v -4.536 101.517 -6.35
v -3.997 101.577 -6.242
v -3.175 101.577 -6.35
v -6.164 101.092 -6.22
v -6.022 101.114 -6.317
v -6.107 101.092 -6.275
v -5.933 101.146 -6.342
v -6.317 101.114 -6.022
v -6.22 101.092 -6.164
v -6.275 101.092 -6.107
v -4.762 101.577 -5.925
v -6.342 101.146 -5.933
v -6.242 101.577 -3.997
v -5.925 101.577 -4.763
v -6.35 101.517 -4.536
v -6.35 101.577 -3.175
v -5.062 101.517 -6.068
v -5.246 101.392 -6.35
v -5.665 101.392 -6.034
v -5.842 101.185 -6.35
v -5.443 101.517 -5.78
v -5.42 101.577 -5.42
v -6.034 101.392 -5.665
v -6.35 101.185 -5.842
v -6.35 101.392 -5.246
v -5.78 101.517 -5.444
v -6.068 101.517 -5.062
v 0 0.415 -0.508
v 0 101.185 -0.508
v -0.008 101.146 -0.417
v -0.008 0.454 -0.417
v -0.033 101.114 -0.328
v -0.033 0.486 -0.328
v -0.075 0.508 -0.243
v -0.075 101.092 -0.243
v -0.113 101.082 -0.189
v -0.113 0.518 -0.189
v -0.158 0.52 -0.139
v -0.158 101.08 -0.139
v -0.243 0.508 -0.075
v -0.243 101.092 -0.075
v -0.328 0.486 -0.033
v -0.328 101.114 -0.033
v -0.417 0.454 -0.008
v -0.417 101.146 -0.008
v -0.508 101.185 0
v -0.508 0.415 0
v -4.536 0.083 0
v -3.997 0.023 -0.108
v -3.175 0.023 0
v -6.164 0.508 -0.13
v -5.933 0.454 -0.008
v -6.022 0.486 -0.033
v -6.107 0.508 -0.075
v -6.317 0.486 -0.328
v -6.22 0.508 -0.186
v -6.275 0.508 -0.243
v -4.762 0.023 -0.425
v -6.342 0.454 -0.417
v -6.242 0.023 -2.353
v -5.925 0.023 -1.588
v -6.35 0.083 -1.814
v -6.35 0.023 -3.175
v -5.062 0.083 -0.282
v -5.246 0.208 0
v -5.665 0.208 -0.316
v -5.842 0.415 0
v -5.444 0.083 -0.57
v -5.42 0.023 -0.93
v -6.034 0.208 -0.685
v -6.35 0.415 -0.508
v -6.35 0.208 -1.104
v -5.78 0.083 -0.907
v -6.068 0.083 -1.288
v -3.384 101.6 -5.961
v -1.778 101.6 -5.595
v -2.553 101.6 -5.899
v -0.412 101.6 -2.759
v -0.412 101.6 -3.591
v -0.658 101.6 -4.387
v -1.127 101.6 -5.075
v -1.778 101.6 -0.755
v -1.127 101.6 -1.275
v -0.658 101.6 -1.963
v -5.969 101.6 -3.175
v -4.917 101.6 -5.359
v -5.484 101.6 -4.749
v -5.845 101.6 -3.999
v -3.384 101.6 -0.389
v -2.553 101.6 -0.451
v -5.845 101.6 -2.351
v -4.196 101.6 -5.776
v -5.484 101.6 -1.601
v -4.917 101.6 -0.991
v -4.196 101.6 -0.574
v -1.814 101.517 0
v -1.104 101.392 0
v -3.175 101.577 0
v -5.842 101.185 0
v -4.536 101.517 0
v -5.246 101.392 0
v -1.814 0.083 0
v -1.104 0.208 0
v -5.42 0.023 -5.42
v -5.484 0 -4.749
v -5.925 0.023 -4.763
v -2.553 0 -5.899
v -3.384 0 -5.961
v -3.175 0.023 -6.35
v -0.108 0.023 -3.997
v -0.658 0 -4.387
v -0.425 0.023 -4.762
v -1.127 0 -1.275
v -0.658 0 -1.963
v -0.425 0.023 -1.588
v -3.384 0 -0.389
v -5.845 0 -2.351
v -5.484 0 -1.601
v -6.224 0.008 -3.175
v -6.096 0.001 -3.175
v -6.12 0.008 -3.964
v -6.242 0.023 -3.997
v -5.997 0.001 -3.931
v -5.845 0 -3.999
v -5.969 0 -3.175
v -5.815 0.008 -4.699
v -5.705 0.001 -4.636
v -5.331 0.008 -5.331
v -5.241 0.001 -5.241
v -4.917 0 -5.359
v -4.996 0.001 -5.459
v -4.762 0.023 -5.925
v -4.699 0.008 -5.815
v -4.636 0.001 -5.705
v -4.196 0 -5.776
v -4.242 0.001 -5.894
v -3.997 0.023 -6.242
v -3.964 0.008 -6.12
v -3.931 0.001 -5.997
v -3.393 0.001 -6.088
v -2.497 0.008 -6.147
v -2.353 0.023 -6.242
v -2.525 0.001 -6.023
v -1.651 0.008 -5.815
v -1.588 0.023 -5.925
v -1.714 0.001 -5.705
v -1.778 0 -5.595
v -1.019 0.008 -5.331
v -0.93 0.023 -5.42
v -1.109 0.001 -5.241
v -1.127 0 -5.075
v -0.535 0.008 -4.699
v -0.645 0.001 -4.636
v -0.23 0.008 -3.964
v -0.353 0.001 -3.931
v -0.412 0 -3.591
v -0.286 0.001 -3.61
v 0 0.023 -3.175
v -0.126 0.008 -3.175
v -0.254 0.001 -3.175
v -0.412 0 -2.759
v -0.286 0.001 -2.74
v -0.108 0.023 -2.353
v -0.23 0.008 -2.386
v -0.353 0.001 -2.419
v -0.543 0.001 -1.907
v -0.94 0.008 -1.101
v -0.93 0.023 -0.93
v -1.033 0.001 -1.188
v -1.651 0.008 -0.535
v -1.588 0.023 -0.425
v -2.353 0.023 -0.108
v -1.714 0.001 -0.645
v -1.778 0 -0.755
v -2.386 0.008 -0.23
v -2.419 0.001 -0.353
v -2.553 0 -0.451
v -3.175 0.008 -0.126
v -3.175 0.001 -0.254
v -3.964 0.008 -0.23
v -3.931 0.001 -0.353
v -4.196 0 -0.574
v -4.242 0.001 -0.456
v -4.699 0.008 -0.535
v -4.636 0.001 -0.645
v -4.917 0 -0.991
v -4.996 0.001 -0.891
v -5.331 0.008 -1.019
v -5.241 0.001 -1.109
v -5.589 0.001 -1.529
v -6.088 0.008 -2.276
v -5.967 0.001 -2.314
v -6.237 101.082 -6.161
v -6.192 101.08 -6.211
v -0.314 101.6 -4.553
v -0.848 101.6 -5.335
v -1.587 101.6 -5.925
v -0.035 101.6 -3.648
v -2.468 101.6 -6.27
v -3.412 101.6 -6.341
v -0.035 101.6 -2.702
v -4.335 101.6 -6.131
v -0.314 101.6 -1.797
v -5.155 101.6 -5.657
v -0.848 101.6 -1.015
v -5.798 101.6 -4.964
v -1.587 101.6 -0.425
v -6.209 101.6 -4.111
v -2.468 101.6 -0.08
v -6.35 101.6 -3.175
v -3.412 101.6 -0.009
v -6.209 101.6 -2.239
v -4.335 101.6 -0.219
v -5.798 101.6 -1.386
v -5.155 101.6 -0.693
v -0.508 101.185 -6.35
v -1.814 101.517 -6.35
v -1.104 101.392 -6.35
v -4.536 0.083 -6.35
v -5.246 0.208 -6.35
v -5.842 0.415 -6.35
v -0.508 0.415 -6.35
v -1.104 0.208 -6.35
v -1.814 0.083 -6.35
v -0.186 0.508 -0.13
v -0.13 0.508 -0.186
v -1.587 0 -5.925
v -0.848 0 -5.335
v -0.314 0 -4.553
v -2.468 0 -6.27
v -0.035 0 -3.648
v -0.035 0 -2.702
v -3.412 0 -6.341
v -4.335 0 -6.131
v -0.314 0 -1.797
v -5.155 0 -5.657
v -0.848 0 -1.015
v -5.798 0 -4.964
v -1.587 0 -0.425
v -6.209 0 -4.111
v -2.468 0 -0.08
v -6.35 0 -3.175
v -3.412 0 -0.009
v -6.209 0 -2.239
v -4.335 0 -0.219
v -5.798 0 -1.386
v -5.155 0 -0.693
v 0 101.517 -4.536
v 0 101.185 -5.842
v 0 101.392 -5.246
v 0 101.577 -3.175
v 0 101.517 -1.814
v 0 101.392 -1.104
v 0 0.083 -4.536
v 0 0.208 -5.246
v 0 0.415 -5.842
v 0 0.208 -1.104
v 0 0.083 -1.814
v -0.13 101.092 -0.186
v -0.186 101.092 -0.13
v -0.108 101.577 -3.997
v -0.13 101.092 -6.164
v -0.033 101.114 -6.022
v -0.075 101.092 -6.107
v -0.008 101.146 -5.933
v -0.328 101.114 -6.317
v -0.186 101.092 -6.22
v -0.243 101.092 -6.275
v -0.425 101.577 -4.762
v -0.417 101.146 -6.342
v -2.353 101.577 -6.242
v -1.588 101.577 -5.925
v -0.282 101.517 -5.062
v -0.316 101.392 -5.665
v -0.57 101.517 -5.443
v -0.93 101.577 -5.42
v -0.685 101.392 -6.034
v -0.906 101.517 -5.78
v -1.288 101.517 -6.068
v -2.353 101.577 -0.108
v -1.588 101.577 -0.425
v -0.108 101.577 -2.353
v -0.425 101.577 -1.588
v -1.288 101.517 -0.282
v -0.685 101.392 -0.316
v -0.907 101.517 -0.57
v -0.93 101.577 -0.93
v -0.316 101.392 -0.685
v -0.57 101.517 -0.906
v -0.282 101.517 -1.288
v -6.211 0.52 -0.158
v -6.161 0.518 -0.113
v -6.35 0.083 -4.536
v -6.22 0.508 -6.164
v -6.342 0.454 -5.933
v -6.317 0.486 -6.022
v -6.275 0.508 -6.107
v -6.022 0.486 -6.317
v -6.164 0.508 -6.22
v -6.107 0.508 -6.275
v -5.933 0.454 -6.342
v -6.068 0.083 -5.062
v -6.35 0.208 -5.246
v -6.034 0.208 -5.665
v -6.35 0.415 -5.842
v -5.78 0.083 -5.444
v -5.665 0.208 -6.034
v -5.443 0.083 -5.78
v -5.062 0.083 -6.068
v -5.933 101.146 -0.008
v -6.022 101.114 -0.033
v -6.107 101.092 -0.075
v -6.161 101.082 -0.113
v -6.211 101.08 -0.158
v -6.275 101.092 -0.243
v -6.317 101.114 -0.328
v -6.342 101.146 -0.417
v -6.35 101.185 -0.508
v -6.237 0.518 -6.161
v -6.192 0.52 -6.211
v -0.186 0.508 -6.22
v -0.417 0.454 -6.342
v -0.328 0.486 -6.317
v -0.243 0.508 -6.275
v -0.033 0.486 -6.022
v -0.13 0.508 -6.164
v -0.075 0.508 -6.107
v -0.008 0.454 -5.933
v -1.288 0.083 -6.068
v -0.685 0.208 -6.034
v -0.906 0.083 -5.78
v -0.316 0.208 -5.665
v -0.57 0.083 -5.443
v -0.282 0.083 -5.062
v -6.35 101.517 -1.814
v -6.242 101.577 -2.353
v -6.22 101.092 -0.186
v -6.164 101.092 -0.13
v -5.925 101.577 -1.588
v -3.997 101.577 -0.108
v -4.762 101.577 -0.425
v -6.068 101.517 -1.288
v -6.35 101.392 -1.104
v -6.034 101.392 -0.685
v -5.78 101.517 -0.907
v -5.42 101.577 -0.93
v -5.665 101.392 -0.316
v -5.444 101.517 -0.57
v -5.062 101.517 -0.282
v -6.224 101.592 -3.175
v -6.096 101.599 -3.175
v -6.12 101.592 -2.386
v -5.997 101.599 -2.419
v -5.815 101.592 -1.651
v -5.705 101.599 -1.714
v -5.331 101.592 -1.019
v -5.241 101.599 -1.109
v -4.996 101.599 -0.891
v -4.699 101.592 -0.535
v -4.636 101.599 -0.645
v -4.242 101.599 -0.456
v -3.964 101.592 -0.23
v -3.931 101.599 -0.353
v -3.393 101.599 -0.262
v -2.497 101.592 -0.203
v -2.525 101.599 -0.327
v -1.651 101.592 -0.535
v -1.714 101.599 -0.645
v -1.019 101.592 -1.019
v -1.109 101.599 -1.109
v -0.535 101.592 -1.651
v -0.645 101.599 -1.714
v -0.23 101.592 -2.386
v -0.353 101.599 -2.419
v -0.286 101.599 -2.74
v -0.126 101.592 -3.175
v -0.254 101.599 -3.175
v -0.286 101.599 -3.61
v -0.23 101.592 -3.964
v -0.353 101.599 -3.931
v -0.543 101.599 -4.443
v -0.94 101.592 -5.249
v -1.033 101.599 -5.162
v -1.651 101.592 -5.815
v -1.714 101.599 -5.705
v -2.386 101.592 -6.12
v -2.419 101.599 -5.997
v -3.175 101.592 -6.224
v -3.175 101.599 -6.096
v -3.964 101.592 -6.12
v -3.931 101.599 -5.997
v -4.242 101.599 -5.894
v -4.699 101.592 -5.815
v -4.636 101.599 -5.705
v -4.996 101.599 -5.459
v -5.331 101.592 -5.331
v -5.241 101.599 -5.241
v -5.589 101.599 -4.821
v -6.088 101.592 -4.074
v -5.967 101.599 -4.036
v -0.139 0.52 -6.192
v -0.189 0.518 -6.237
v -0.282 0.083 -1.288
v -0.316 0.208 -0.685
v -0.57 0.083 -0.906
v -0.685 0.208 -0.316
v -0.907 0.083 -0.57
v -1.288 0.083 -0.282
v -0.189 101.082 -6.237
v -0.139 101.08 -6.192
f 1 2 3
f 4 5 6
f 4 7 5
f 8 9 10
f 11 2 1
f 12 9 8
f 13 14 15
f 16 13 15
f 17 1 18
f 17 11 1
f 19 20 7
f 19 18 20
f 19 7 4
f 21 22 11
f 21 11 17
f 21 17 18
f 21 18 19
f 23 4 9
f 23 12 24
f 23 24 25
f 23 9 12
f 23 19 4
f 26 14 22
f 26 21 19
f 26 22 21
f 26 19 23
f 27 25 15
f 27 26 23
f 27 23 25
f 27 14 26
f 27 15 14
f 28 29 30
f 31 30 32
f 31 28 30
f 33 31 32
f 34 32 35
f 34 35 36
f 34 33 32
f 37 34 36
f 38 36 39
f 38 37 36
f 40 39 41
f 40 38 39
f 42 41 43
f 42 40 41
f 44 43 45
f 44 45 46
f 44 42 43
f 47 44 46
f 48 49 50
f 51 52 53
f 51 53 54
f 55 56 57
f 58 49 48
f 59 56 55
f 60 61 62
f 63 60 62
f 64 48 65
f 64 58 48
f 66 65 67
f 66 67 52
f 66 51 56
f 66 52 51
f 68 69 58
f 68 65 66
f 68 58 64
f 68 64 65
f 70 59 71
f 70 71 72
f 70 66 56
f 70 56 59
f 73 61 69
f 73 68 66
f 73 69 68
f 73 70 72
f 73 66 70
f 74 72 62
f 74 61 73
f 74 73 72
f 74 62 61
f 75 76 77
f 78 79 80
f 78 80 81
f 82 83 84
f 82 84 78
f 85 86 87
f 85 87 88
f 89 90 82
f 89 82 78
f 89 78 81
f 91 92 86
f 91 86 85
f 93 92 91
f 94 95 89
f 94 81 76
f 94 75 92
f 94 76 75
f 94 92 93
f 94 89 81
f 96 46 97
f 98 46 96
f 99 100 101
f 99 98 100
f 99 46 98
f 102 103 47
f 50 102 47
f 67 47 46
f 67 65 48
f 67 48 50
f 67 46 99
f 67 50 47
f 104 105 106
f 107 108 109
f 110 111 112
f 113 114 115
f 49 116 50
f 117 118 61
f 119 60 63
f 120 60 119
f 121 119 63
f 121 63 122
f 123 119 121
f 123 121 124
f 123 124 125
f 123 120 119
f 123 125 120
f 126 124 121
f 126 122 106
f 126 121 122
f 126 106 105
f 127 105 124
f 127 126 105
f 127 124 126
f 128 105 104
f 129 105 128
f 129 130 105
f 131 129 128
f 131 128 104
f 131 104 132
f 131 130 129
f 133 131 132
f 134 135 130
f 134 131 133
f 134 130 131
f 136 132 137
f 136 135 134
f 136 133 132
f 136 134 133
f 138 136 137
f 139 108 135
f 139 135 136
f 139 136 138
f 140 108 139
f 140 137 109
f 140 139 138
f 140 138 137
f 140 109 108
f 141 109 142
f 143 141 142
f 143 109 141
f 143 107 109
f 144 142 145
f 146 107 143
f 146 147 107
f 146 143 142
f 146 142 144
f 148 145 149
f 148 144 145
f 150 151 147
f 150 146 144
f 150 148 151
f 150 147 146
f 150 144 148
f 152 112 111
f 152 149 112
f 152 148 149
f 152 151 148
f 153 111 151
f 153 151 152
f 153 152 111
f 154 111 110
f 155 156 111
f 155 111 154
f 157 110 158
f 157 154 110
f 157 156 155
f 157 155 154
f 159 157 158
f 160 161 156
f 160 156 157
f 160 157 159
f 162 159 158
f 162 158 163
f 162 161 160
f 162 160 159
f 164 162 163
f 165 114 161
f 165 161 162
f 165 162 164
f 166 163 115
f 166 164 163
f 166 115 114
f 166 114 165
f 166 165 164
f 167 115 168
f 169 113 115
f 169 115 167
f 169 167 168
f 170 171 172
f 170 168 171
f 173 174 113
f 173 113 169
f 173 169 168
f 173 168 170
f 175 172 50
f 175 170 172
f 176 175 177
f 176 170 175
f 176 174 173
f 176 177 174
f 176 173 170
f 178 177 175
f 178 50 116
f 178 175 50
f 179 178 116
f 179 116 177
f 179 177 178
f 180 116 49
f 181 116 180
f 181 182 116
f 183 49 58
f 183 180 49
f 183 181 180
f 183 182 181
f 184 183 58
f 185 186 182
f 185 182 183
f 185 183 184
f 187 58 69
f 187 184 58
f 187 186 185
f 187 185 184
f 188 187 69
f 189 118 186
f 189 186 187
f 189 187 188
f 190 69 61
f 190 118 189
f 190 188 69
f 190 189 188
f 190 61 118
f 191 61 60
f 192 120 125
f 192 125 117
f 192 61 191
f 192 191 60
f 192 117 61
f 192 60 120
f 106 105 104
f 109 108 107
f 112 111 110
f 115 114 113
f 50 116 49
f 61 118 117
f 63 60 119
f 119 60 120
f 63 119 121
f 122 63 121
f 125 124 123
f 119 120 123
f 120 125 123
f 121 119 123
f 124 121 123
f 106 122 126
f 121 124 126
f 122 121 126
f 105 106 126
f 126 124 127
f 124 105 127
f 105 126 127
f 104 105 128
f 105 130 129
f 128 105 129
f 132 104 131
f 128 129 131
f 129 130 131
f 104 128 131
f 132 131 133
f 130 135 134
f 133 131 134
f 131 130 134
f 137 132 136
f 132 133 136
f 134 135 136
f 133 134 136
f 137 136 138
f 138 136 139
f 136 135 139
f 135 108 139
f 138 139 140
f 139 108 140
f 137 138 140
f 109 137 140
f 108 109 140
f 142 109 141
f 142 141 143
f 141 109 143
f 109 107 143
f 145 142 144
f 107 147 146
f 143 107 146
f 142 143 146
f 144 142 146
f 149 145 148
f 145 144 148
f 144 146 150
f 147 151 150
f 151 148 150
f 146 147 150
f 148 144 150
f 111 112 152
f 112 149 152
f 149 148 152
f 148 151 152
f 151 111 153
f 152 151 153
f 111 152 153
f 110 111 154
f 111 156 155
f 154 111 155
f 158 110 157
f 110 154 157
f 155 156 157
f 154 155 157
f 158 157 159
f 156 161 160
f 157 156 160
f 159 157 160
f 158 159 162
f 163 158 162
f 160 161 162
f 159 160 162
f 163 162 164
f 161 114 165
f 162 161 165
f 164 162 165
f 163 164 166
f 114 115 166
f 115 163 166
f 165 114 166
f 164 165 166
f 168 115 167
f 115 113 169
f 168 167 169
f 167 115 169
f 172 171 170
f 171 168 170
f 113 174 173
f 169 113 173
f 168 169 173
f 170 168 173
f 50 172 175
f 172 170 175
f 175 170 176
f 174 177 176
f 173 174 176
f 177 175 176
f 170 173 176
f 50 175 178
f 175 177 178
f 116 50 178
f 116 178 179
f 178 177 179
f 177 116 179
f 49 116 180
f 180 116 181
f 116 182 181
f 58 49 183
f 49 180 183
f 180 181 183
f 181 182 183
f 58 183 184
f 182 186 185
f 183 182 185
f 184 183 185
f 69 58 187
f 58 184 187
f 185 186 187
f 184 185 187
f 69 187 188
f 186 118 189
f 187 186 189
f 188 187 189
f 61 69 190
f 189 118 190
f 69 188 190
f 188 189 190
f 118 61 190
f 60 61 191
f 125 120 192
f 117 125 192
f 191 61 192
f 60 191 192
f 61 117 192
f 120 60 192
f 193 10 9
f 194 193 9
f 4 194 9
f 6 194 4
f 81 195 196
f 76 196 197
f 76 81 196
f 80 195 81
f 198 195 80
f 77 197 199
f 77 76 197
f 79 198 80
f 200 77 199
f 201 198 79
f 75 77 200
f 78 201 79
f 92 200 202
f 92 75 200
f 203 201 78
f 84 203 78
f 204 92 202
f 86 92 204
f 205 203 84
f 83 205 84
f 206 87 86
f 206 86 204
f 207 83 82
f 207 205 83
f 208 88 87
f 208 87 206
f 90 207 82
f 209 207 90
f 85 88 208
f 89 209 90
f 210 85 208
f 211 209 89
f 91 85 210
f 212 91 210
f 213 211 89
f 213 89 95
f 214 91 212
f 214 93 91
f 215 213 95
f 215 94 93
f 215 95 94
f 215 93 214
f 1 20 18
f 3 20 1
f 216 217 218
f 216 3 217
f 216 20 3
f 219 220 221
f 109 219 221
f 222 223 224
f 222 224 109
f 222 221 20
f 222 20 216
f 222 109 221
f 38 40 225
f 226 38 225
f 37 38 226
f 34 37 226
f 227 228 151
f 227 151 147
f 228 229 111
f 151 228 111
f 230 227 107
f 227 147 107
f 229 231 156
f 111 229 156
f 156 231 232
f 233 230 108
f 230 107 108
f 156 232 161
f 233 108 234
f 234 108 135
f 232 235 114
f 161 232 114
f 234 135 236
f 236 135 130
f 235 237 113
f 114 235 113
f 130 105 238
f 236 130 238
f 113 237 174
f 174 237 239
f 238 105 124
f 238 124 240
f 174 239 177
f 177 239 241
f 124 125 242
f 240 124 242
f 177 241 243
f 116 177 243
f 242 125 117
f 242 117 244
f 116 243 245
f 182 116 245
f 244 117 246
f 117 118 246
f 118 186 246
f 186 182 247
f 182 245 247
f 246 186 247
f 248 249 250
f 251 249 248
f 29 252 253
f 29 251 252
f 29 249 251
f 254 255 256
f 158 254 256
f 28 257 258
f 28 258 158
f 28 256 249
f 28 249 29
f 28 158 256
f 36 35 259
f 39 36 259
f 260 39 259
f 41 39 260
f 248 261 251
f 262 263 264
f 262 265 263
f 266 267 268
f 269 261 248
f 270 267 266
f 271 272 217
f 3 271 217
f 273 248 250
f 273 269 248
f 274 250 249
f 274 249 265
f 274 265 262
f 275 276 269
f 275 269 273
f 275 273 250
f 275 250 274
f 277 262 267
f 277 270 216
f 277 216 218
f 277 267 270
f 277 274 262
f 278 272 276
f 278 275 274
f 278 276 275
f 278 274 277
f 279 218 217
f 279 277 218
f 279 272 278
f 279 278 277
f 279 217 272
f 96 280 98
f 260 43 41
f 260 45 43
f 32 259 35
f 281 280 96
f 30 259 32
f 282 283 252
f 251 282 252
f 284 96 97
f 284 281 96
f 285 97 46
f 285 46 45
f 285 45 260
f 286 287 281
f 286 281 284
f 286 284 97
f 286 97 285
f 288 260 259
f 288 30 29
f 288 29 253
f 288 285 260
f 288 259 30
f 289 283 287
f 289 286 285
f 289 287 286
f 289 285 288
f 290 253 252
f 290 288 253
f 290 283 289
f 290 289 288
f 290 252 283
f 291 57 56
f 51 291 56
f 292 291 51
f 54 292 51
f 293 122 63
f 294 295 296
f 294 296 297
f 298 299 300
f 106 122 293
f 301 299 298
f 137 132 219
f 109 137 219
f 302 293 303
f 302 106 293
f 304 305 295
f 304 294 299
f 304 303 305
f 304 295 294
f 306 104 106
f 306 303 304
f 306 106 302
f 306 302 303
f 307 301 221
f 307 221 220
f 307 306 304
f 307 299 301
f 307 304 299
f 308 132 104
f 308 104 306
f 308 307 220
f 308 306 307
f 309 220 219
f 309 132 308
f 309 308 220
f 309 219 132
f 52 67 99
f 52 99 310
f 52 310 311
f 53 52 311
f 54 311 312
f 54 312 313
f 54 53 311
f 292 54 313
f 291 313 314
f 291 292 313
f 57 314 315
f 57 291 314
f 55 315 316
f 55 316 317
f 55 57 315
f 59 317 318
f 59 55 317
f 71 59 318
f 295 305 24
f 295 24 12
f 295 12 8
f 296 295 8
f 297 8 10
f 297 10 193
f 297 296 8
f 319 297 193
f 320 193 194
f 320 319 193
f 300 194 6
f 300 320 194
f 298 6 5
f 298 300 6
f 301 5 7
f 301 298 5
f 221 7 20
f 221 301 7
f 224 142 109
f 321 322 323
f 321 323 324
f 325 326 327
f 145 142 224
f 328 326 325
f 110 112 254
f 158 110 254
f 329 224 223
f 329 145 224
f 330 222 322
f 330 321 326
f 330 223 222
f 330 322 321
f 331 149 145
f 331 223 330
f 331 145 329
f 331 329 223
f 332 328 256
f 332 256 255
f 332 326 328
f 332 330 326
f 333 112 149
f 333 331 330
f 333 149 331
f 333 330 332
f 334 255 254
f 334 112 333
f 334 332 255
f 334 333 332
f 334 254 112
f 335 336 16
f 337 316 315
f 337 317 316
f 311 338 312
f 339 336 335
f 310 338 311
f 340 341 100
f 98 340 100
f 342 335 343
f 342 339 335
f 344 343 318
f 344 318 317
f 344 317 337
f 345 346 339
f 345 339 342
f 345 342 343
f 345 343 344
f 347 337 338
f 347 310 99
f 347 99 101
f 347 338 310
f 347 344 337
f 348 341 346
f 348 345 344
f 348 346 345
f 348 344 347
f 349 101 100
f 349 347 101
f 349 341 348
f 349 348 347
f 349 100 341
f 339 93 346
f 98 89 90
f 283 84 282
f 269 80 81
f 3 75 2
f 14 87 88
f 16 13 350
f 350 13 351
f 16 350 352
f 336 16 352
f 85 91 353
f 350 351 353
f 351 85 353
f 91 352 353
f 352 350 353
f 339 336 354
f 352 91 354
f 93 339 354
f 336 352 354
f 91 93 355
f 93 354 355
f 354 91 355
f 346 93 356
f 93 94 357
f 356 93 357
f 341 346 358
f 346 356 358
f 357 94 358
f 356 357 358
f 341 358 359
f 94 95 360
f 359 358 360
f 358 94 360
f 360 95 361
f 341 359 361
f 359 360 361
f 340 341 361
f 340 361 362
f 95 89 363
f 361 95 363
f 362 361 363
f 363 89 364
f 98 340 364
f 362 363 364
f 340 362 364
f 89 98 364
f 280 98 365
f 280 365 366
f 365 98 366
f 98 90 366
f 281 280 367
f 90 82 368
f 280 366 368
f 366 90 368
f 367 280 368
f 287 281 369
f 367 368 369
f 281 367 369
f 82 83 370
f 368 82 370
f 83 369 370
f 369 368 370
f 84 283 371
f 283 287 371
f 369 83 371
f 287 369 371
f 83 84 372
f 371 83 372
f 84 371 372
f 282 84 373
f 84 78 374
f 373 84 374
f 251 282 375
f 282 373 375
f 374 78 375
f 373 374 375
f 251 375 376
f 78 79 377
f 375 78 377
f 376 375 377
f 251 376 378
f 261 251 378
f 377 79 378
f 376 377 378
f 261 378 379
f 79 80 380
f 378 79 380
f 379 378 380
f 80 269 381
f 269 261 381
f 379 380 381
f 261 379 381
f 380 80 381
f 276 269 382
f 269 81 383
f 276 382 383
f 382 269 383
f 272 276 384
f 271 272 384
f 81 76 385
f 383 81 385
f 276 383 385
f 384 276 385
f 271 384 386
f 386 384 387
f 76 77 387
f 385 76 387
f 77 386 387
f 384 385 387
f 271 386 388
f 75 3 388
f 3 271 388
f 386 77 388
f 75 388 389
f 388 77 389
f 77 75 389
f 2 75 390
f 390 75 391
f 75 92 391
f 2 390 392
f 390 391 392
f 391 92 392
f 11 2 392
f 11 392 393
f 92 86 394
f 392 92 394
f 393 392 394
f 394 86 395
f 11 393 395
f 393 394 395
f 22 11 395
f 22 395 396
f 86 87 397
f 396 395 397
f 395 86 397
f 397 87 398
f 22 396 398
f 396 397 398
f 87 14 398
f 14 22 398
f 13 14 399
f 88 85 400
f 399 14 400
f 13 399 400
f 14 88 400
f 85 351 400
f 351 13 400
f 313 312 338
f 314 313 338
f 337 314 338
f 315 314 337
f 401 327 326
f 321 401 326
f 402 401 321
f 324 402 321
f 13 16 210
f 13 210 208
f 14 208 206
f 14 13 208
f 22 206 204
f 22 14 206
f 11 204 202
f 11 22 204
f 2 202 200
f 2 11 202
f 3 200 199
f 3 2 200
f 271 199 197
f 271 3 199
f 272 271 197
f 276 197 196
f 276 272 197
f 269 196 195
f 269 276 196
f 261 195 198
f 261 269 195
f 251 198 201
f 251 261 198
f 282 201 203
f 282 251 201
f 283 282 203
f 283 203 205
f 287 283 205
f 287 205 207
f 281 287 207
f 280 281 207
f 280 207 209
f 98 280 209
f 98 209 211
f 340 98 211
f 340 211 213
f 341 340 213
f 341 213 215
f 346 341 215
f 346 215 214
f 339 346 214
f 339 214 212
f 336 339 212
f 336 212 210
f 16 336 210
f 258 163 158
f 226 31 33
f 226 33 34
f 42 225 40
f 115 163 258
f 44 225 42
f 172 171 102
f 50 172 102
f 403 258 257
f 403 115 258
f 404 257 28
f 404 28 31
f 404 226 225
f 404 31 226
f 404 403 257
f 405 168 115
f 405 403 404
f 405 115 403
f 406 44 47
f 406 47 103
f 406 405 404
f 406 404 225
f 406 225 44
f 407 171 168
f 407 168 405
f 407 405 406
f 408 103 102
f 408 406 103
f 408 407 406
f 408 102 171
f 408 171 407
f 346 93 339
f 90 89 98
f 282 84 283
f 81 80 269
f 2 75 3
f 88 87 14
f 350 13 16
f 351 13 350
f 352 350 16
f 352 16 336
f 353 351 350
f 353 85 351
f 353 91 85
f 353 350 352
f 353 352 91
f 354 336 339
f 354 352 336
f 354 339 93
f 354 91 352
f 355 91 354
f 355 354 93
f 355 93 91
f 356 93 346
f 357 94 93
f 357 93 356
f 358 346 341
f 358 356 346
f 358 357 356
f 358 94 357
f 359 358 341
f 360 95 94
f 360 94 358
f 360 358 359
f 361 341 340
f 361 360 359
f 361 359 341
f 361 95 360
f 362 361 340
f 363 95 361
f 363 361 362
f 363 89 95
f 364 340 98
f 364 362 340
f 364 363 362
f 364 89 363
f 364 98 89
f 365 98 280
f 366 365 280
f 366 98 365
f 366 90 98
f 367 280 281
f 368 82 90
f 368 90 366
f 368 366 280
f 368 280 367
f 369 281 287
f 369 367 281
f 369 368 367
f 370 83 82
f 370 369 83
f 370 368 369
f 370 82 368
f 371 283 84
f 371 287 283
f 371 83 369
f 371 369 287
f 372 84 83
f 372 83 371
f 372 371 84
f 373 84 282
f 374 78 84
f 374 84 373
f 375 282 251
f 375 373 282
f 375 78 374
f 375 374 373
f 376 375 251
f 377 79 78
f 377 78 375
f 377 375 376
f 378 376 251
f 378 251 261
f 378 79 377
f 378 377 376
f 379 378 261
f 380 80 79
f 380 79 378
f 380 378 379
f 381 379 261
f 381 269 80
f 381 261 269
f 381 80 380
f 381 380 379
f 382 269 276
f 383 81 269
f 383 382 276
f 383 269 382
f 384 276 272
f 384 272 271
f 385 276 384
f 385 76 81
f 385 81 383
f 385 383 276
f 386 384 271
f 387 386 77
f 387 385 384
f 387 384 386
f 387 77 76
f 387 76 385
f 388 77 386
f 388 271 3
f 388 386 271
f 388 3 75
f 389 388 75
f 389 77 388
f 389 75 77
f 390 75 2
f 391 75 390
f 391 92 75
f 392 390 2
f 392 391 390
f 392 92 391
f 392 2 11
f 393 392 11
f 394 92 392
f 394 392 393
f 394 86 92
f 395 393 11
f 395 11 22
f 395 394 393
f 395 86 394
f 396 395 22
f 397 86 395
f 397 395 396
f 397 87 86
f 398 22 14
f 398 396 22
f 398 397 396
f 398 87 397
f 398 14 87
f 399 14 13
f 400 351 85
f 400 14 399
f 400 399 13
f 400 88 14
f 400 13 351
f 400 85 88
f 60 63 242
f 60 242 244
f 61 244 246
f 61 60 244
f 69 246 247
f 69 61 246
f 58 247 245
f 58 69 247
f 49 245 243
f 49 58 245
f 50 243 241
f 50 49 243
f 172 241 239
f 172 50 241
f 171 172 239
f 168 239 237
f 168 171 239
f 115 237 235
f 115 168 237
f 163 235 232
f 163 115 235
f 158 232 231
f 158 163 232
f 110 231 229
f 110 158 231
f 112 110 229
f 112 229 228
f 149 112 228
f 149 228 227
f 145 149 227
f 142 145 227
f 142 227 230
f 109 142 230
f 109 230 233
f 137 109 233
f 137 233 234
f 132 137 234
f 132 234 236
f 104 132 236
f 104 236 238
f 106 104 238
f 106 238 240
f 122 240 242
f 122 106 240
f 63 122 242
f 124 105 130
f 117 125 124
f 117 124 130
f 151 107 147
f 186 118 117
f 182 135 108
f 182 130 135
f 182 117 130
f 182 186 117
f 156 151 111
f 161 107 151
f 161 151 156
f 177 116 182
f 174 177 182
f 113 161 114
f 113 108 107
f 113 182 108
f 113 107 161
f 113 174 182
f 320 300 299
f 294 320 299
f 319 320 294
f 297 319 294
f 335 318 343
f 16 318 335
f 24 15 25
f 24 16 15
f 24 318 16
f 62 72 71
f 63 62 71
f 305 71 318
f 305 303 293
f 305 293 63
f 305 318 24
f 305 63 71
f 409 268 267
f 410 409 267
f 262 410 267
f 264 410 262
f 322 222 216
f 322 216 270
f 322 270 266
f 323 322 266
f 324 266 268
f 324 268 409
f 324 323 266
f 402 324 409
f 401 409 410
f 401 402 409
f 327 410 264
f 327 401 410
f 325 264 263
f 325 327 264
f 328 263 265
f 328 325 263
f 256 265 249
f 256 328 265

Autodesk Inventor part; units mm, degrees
ref_plane "YZ Plane" through (0, 0, 0) normal (1, 0, 0) x (0, 1, 0)
sketch "Sketch1" plane through (0, 0, 0) normal (0, 1, 0) x (-1, 0, 0)
  line L0 (0.508, 0) -> (5.842, 0)
  line L1 (6.35, -0.508) -> (6.35, -5.842)
  line L2 (5.842, -6.35) -> (0.508, -6.35)
  line L3 (0, -5.842) -> (0, -0.508)
  arc A0 (5.842, -6.35) -> (6.35, -5.842) centre (5.842, -5.842) ccw
  arc A1 (0, -5.842) -> (0.508, -6.35) centre (0.508, -5.842) ccw
  arc A2 (0.508, 0) -> (0, -0.508) centre (0.508, -0.508) ccw
  arc A3 (6.35, -0.508) -> (5.842, 0) centre (5.842, -0.508) ccw
  arc A4 (3.8748, -6.35) -> (6.35, -3.8748) centre (3.175, -3.175) ccw
  arc A5 (0, -3.8748) -> (2.4752, -6.35) centre (3.175, -3.175) ccw
  arc A6 (6.35, -2.4752) -> (3.8748, 0) centre (3.175, -3.175) ccw
  arc A7 (2.4752, 0) -> (0, -2.4752) centre (3.175, -3.175) ccw
  point P0 (0, 0)
  point P1 (6.35, -6.35)
  point P2 (6.35, 0)
  point P3 (0, -6.35)
  dimension "d0" = 6.35
  dimension "d1" = 6.35
  dimension "d2" = 0.508
extrude "Extrusion1" add sketch "Sketch1" along normal blind 101.6
ref_plane "Work Plane1" through (-0.508, 0, -3.175) normal (0, 0, -1) x (-1, 0, 0)
sketch "Sketch2" plane through (-0.508, 0, -3.175) normal (0, 0, -1) x (-1, 0, 0)
  line L0 (-0.508, 0) -> (-0.508, 101.6) projected
  line L1 (-0.508, 101.6) -> (5.842, 101.6) projected
  line L2 (5.842, 101.6) -> (5.842, 0) projected
  line L3 (5.842, 0) -> (-0.508, 0) projected
  line L4 (2.667, 101.6) -> (2.667, 102.3112)
  line L5 (2.667, 102.3112) -> (6.9342, 102.3112)
  line L6 (2.667, 101.6) -> (5.461, 101.6)
  arc A0 (6.9342, 101.092) -> (5.461, 101.6) centre (5.5146, 99.3654) ccw
  line L7 (6.9342, 102.3112) -> (7.1928, 102.3112)
  line L8 (7.1928, 102.3112) -> (7.1928, 100.842)
  line L9 (7.1928, 100.842) -> (6.9342, 101.092)
  dimension "d6" = 0.7112
  dimension "d7" = 4.2672
  dimension "d8" = 1.2192
  dimension "d9" = 2.794
  dimension "d10" = 2.2352
revolve "Revolution1" cut sketch "Sketch2" angle 360 about axis through (-3.175, 101.6, -3.175) along (0, 1, 0) contours L4 L5 L7 L8 L9 A0 L1
ref_plane "Work Plane2" through (-3.175, 50.8, -3.175) normal (0, 1, 0) x (1, 0, 0)
mirror "Mirror1" about plane through (-3.175, 50.8, -3.175) normal (0, 1, 0) of "Revolution1"
properties part number "276-3523"
